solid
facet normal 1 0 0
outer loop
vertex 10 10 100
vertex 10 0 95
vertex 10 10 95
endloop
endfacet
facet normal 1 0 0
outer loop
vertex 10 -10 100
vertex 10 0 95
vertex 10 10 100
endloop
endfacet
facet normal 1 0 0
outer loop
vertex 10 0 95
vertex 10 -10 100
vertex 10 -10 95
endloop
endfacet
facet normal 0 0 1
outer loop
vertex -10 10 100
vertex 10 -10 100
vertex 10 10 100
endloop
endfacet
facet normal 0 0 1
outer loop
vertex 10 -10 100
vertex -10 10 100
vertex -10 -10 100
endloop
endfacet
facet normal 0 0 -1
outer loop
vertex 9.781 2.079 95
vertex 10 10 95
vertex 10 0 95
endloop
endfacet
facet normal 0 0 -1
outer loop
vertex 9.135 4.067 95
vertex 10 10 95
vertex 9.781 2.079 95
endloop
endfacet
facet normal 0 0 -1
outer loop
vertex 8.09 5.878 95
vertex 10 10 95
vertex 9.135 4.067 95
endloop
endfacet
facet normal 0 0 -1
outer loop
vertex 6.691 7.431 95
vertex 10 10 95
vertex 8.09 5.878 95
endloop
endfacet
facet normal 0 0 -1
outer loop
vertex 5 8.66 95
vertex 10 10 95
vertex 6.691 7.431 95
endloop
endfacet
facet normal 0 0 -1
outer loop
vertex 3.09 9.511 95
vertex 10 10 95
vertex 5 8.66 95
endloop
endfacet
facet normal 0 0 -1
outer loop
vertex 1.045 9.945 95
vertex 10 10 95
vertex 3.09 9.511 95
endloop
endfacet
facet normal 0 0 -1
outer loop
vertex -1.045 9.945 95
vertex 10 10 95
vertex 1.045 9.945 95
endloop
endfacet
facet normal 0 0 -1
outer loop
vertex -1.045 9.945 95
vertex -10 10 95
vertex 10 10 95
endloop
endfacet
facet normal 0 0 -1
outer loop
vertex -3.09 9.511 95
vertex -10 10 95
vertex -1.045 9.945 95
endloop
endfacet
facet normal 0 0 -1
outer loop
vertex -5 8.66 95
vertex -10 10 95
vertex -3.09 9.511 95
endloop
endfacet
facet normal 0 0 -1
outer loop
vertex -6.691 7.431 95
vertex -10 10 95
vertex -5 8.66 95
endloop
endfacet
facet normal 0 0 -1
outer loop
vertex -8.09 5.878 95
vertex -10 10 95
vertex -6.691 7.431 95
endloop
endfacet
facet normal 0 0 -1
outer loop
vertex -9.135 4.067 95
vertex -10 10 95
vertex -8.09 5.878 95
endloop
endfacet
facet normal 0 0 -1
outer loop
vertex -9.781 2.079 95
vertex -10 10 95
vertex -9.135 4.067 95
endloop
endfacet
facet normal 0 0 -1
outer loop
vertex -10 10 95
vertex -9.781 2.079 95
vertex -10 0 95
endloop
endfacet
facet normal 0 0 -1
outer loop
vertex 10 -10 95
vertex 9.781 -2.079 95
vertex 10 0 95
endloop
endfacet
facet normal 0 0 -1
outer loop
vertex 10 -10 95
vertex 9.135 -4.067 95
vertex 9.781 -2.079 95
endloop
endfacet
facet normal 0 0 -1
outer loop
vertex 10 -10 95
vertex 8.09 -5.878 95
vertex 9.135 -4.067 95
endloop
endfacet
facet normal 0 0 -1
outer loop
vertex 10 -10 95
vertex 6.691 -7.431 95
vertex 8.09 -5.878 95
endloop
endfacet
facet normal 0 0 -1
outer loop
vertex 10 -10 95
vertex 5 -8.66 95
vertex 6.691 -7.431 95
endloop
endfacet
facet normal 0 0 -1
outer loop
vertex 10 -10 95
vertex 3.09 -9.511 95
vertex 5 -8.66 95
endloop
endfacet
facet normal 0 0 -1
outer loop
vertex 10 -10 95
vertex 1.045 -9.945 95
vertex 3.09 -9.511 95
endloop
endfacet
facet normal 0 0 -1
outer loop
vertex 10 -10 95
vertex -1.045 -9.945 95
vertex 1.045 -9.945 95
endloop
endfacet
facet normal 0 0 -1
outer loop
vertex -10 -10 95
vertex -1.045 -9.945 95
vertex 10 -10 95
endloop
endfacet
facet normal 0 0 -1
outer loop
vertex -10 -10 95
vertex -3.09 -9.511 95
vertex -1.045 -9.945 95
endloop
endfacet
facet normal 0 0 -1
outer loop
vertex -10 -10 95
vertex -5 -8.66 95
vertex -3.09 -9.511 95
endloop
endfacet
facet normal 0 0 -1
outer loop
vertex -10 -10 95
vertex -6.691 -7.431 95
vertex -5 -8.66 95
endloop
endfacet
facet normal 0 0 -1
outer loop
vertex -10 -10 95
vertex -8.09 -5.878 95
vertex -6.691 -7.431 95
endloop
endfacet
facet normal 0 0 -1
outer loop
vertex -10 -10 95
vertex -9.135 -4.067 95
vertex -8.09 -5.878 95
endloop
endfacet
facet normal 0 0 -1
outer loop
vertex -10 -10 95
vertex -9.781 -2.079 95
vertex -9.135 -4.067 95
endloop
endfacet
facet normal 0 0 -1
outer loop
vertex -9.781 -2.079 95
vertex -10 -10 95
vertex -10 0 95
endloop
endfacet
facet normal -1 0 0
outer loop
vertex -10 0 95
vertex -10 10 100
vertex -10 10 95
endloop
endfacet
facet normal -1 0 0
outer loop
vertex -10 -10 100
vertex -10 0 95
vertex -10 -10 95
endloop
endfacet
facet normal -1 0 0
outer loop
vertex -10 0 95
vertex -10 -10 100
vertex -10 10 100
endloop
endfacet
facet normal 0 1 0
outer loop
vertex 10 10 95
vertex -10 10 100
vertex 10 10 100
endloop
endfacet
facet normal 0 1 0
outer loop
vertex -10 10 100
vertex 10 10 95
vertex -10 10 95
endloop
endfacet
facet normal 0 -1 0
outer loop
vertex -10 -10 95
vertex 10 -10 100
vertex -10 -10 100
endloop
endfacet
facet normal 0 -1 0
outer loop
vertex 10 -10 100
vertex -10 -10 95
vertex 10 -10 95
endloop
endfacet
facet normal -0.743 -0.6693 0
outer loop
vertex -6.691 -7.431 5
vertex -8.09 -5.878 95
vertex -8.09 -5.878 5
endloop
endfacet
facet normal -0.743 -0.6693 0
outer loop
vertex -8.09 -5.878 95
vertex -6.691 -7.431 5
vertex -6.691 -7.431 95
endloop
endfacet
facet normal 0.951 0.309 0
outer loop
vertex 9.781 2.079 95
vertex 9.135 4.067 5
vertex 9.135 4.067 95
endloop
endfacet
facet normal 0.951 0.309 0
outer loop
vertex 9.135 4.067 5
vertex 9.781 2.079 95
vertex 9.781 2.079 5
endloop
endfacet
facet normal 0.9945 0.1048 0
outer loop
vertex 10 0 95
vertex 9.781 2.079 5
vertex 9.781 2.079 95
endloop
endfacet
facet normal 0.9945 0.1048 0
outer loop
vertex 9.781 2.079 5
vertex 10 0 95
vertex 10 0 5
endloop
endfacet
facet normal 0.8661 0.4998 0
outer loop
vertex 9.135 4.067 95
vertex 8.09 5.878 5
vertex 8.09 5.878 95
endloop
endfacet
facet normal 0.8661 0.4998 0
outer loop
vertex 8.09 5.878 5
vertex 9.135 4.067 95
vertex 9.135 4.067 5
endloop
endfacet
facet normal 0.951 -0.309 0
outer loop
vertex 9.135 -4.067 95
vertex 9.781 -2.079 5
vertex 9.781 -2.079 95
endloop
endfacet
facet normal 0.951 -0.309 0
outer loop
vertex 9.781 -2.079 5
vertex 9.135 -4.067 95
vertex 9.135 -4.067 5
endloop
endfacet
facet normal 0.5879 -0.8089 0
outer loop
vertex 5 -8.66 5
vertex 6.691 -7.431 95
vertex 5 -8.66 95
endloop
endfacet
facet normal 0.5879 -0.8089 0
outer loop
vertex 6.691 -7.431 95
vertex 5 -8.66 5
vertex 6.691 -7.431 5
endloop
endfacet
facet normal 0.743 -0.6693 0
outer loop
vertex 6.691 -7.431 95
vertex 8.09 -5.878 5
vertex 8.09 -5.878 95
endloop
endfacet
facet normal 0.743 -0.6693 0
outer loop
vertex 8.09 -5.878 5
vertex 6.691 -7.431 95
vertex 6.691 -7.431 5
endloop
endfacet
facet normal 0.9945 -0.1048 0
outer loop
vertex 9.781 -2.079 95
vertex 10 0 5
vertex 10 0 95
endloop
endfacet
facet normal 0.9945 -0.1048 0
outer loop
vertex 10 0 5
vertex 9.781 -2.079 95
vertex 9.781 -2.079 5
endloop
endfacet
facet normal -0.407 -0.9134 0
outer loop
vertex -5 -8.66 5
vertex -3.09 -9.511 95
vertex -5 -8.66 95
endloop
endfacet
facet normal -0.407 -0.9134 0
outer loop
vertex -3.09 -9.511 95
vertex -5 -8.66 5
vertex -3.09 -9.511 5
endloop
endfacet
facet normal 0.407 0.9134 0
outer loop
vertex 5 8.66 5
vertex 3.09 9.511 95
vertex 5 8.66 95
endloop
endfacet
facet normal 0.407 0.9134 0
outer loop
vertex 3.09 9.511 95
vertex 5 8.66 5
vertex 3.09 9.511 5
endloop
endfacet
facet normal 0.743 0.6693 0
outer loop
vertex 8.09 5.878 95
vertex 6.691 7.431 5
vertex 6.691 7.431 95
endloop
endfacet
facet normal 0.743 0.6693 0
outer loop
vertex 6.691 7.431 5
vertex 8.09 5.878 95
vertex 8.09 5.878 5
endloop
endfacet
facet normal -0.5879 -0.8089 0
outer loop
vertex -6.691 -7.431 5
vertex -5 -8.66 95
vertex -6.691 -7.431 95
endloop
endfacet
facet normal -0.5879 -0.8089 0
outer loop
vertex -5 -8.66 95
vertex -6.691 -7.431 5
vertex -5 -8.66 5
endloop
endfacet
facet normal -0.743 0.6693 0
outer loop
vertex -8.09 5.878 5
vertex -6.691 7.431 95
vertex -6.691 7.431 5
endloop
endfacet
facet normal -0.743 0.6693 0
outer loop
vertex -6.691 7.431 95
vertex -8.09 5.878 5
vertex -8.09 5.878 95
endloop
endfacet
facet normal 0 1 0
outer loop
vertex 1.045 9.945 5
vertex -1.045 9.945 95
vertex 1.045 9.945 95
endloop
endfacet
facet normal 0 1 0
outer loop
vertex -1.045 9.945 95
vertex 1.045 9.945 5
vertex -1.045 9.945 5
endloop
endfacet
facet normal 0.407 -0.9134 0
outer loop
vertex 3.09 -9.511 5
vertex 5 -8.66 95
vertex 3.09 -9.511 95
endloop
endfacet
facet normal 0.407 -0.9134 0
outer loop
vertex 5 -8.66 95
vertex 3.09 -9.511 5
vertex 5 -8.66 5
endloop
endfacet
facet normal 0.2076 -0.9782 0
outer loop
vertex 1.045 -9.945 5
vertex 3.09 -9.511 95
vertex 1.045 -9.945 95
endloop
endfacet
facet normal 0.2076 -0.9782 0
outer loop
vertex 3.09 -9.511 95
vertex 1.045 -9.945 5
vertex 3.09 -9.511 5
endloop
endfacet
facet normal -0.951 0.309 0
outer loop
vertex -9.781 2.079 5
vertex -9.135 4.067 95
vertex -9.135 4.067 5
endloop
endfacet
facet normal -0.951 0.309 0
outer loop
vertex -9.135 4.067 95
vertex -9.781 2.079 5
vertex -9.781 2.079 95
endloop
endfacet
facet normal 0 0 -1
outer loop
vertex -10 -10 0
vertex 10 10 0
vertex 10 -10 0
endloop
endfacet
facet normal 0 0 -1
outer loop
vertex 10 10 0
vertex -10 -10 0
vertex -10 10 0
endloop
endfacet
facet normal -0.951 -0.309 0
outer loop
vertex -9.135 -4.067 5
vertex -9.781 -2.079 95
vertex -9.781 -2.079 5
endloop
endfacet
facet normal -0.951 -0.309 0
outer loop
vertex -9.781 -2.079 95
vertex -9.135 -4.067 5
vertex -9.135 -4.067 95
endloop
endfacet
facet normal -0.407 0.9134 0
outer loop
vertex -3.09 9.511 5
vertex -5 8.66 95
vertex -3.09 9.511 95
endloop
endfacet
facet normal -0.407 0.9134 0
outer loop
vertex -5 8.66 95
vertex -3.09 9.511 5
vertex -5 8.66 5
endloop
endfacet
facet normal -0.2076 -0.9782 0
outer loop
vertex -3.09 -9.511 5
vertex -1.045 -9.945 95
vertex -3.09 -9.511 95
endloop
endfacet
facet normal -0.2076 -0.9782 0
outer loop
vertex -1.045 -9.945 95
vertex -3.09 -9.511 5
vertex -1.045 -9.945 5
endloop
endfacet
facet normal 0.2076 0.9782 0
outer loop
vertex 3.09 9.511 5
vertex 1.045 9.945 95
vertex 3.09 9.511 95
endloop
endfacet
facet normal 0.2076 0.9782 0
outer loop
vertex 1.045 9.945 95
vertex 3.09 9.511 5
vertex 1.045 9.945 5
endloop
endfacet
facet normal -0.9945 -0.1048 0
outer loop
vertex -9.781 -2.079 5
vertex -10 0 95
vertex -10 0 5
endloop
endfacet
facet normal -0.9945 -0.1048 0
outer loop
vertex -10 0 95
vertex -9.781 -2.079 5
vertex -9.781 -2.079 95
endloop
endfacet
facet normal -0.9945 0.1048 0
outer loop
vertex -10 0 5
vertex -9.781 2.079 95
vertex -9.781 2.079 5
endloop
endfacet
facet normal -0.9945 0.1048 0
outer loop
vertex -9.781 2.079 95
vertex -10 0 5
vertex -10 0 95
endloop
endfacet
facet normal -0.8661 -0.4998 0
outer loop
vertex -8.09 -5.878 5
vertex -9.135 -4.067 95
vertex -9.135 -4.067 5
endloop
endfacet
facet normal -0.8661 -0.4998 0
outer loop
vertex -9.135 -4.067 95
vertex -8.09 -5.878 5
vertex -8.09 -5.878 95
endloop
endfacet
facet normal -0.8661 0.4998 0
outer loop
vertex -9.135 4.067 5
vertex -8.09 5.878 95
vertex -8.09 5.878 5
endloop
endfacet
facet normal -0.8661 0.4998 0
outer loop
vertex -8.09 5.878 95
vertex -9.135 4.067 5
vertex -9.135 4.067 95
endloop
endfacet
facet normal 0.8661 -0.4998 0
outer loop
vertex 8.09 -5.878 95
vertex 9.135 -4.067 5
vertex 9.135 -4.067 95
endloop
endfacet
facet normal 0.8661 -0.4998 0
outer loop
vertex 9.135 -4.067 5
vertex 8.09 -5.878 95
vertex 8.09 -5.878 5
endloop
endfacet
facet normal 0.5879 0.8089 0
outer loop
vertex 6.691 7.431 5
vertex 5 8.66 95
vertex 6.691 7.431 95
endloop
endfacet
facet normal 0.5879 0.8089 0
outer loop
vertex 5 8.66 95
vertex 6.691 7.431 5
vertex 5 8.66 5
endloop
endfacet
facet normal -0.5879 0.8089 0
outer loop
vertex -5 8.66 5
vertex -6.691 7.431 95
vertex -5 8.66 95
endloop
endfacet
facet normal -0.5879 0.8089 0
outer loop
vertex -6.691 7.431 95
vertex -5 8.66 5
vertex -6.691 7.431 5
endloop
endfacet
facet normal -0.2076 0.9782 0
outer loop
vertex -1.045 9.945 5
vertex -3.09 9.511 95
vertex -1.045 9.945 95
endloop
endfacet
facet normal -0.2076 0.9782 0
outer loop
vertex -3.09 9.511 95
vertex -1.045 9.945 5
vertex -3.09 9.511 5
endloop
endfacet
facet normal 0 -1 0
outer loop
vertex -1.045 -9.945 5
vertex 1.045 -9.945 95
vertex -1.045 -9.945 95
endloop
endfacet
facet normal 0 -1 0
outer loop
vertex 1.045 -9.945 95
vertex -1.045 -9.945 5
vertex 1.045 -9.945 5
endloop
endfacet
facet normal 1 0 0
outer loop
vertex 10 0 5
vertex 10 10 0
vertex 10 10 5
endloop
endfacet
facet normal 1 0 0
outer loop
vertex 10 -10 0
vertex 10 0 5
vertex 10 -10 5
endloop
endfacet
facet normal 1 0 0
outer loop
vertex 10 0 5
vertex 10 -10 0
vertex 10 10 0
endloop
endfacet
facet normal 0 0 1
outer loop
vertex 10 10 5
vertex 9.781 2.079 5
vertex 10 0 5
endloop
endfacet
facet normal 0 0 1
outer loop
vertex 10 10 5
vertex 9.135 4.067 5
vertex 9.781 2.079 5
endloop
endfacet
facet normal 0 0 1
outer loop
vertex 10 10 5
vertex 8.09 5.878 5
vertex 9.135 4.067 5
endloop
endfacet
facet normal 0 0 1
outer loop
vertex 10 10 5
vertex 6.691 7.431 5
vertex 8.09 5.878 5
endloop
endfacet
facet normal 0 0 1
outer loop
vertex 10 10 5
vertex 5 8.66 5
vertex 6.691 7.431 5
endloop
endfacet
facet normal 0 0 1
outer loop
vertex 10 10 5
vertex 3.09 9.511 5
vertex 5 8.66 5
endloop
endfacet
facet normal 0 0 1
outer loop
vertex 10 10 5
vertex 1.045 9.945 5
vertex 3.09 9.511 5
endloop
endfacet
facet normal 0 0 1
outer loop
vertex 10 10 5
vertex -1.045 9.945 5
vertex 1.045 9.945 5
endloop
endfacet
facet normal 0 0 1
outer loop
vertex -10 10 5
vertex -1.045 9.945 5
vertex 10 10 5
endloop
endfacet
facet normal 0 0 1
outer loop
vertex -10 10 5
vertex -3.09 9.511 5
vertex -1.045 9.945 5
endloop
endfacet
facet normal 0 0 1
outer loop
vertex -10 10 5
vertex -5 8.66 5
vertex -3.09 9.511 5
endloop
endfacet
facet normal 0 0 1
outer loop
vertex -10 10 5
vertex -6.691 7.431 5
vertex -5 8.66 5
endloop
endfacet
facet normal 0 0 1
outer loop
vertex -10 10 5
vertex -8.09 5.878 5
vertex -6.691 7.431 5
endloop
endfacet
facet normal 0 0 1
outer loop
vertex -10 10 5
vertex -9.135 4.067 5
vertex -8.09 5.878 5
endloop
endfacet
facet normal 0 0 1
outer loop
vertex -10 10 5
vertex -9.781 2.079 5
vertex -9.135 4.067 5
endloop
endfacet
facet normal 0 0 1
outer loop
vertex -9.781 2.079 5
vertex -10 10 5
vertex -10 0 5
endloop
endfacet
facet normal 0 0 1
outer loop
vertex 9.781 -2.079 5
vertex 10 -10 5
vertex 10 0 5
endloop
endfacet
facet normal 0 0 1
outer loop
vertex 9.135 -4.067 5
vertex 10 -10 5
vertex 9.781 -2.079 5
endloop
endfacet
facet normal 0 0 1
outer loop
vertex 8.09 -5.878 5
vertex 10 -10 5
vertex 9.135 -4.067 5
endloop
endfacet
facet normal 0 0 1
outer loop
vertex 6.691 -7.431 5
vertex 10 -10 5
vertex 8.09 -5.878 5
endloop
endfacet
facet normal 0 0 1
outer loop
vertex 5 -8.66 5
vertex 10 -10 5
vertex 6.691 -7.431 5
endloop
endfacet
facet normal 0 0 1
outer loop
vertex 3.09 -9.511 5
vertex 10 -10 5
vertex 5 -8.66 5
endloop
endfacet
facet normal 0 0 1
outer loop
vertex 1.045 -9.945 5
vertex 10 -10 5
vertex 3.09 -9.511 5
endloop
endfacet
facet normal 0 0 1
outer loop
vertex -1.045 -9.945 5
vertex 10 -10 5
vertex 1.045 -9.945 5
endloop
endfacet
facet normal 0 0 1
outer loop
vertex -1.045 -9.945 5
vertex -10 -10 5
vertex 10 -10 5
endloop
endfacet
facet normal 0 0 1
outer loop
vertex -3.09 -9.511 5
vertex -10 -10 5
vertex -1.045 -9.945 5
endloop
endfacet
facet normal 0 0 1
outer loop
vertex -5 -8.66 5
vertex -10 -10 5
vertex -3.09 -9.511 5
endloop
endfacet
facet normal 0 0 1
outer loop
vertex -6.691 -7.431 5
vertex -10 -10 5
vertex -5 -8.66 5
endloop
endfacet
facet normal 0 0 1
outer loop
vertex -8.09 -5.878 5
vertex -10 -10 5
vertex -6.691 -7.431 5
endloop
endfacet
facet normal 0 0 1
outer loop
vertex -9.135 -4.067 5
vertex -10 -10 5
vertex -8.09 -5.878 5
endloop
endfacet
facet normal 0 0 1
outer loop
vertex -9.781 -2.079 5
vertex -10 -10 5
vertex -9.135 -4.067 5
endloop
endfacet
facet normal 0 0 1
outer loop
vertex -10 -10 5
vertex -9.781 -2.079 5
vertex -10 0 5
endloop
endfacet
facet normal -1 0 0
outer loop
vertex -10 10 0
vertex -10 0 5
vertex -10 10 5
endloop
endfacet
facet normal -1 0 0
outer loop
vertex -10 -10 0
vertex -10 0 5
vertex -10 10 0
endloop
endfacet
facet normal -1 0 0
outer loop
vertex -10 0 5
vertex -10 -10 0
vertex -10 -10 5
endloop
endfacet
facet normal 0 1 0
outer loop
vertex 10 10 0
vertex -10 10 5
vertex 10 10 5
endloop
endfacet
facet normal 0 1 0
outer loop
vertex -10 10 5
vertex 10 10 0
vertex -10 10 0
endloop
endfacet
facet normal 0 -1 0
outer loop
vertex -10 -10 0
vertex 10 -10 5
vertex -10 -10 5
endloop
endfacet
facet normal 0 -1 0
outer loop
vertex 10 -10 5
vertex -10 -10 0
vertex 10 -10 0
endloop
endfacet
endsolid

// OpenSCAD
//column.scad v4
 
color("white") column(100, 20);
 
 module column(height, width){
    radius = 0.5*width;
     
    translate([-radius, -radius,0.95*height]) 
        cube([2*radius,2*radius,.05*height]);
    cylinder(h=height, r1=radius, r2=radius);
    translate([-radius, -radius,0]) 
        cube([2*radius,2*radius,.05*height]);
 }

  
 
